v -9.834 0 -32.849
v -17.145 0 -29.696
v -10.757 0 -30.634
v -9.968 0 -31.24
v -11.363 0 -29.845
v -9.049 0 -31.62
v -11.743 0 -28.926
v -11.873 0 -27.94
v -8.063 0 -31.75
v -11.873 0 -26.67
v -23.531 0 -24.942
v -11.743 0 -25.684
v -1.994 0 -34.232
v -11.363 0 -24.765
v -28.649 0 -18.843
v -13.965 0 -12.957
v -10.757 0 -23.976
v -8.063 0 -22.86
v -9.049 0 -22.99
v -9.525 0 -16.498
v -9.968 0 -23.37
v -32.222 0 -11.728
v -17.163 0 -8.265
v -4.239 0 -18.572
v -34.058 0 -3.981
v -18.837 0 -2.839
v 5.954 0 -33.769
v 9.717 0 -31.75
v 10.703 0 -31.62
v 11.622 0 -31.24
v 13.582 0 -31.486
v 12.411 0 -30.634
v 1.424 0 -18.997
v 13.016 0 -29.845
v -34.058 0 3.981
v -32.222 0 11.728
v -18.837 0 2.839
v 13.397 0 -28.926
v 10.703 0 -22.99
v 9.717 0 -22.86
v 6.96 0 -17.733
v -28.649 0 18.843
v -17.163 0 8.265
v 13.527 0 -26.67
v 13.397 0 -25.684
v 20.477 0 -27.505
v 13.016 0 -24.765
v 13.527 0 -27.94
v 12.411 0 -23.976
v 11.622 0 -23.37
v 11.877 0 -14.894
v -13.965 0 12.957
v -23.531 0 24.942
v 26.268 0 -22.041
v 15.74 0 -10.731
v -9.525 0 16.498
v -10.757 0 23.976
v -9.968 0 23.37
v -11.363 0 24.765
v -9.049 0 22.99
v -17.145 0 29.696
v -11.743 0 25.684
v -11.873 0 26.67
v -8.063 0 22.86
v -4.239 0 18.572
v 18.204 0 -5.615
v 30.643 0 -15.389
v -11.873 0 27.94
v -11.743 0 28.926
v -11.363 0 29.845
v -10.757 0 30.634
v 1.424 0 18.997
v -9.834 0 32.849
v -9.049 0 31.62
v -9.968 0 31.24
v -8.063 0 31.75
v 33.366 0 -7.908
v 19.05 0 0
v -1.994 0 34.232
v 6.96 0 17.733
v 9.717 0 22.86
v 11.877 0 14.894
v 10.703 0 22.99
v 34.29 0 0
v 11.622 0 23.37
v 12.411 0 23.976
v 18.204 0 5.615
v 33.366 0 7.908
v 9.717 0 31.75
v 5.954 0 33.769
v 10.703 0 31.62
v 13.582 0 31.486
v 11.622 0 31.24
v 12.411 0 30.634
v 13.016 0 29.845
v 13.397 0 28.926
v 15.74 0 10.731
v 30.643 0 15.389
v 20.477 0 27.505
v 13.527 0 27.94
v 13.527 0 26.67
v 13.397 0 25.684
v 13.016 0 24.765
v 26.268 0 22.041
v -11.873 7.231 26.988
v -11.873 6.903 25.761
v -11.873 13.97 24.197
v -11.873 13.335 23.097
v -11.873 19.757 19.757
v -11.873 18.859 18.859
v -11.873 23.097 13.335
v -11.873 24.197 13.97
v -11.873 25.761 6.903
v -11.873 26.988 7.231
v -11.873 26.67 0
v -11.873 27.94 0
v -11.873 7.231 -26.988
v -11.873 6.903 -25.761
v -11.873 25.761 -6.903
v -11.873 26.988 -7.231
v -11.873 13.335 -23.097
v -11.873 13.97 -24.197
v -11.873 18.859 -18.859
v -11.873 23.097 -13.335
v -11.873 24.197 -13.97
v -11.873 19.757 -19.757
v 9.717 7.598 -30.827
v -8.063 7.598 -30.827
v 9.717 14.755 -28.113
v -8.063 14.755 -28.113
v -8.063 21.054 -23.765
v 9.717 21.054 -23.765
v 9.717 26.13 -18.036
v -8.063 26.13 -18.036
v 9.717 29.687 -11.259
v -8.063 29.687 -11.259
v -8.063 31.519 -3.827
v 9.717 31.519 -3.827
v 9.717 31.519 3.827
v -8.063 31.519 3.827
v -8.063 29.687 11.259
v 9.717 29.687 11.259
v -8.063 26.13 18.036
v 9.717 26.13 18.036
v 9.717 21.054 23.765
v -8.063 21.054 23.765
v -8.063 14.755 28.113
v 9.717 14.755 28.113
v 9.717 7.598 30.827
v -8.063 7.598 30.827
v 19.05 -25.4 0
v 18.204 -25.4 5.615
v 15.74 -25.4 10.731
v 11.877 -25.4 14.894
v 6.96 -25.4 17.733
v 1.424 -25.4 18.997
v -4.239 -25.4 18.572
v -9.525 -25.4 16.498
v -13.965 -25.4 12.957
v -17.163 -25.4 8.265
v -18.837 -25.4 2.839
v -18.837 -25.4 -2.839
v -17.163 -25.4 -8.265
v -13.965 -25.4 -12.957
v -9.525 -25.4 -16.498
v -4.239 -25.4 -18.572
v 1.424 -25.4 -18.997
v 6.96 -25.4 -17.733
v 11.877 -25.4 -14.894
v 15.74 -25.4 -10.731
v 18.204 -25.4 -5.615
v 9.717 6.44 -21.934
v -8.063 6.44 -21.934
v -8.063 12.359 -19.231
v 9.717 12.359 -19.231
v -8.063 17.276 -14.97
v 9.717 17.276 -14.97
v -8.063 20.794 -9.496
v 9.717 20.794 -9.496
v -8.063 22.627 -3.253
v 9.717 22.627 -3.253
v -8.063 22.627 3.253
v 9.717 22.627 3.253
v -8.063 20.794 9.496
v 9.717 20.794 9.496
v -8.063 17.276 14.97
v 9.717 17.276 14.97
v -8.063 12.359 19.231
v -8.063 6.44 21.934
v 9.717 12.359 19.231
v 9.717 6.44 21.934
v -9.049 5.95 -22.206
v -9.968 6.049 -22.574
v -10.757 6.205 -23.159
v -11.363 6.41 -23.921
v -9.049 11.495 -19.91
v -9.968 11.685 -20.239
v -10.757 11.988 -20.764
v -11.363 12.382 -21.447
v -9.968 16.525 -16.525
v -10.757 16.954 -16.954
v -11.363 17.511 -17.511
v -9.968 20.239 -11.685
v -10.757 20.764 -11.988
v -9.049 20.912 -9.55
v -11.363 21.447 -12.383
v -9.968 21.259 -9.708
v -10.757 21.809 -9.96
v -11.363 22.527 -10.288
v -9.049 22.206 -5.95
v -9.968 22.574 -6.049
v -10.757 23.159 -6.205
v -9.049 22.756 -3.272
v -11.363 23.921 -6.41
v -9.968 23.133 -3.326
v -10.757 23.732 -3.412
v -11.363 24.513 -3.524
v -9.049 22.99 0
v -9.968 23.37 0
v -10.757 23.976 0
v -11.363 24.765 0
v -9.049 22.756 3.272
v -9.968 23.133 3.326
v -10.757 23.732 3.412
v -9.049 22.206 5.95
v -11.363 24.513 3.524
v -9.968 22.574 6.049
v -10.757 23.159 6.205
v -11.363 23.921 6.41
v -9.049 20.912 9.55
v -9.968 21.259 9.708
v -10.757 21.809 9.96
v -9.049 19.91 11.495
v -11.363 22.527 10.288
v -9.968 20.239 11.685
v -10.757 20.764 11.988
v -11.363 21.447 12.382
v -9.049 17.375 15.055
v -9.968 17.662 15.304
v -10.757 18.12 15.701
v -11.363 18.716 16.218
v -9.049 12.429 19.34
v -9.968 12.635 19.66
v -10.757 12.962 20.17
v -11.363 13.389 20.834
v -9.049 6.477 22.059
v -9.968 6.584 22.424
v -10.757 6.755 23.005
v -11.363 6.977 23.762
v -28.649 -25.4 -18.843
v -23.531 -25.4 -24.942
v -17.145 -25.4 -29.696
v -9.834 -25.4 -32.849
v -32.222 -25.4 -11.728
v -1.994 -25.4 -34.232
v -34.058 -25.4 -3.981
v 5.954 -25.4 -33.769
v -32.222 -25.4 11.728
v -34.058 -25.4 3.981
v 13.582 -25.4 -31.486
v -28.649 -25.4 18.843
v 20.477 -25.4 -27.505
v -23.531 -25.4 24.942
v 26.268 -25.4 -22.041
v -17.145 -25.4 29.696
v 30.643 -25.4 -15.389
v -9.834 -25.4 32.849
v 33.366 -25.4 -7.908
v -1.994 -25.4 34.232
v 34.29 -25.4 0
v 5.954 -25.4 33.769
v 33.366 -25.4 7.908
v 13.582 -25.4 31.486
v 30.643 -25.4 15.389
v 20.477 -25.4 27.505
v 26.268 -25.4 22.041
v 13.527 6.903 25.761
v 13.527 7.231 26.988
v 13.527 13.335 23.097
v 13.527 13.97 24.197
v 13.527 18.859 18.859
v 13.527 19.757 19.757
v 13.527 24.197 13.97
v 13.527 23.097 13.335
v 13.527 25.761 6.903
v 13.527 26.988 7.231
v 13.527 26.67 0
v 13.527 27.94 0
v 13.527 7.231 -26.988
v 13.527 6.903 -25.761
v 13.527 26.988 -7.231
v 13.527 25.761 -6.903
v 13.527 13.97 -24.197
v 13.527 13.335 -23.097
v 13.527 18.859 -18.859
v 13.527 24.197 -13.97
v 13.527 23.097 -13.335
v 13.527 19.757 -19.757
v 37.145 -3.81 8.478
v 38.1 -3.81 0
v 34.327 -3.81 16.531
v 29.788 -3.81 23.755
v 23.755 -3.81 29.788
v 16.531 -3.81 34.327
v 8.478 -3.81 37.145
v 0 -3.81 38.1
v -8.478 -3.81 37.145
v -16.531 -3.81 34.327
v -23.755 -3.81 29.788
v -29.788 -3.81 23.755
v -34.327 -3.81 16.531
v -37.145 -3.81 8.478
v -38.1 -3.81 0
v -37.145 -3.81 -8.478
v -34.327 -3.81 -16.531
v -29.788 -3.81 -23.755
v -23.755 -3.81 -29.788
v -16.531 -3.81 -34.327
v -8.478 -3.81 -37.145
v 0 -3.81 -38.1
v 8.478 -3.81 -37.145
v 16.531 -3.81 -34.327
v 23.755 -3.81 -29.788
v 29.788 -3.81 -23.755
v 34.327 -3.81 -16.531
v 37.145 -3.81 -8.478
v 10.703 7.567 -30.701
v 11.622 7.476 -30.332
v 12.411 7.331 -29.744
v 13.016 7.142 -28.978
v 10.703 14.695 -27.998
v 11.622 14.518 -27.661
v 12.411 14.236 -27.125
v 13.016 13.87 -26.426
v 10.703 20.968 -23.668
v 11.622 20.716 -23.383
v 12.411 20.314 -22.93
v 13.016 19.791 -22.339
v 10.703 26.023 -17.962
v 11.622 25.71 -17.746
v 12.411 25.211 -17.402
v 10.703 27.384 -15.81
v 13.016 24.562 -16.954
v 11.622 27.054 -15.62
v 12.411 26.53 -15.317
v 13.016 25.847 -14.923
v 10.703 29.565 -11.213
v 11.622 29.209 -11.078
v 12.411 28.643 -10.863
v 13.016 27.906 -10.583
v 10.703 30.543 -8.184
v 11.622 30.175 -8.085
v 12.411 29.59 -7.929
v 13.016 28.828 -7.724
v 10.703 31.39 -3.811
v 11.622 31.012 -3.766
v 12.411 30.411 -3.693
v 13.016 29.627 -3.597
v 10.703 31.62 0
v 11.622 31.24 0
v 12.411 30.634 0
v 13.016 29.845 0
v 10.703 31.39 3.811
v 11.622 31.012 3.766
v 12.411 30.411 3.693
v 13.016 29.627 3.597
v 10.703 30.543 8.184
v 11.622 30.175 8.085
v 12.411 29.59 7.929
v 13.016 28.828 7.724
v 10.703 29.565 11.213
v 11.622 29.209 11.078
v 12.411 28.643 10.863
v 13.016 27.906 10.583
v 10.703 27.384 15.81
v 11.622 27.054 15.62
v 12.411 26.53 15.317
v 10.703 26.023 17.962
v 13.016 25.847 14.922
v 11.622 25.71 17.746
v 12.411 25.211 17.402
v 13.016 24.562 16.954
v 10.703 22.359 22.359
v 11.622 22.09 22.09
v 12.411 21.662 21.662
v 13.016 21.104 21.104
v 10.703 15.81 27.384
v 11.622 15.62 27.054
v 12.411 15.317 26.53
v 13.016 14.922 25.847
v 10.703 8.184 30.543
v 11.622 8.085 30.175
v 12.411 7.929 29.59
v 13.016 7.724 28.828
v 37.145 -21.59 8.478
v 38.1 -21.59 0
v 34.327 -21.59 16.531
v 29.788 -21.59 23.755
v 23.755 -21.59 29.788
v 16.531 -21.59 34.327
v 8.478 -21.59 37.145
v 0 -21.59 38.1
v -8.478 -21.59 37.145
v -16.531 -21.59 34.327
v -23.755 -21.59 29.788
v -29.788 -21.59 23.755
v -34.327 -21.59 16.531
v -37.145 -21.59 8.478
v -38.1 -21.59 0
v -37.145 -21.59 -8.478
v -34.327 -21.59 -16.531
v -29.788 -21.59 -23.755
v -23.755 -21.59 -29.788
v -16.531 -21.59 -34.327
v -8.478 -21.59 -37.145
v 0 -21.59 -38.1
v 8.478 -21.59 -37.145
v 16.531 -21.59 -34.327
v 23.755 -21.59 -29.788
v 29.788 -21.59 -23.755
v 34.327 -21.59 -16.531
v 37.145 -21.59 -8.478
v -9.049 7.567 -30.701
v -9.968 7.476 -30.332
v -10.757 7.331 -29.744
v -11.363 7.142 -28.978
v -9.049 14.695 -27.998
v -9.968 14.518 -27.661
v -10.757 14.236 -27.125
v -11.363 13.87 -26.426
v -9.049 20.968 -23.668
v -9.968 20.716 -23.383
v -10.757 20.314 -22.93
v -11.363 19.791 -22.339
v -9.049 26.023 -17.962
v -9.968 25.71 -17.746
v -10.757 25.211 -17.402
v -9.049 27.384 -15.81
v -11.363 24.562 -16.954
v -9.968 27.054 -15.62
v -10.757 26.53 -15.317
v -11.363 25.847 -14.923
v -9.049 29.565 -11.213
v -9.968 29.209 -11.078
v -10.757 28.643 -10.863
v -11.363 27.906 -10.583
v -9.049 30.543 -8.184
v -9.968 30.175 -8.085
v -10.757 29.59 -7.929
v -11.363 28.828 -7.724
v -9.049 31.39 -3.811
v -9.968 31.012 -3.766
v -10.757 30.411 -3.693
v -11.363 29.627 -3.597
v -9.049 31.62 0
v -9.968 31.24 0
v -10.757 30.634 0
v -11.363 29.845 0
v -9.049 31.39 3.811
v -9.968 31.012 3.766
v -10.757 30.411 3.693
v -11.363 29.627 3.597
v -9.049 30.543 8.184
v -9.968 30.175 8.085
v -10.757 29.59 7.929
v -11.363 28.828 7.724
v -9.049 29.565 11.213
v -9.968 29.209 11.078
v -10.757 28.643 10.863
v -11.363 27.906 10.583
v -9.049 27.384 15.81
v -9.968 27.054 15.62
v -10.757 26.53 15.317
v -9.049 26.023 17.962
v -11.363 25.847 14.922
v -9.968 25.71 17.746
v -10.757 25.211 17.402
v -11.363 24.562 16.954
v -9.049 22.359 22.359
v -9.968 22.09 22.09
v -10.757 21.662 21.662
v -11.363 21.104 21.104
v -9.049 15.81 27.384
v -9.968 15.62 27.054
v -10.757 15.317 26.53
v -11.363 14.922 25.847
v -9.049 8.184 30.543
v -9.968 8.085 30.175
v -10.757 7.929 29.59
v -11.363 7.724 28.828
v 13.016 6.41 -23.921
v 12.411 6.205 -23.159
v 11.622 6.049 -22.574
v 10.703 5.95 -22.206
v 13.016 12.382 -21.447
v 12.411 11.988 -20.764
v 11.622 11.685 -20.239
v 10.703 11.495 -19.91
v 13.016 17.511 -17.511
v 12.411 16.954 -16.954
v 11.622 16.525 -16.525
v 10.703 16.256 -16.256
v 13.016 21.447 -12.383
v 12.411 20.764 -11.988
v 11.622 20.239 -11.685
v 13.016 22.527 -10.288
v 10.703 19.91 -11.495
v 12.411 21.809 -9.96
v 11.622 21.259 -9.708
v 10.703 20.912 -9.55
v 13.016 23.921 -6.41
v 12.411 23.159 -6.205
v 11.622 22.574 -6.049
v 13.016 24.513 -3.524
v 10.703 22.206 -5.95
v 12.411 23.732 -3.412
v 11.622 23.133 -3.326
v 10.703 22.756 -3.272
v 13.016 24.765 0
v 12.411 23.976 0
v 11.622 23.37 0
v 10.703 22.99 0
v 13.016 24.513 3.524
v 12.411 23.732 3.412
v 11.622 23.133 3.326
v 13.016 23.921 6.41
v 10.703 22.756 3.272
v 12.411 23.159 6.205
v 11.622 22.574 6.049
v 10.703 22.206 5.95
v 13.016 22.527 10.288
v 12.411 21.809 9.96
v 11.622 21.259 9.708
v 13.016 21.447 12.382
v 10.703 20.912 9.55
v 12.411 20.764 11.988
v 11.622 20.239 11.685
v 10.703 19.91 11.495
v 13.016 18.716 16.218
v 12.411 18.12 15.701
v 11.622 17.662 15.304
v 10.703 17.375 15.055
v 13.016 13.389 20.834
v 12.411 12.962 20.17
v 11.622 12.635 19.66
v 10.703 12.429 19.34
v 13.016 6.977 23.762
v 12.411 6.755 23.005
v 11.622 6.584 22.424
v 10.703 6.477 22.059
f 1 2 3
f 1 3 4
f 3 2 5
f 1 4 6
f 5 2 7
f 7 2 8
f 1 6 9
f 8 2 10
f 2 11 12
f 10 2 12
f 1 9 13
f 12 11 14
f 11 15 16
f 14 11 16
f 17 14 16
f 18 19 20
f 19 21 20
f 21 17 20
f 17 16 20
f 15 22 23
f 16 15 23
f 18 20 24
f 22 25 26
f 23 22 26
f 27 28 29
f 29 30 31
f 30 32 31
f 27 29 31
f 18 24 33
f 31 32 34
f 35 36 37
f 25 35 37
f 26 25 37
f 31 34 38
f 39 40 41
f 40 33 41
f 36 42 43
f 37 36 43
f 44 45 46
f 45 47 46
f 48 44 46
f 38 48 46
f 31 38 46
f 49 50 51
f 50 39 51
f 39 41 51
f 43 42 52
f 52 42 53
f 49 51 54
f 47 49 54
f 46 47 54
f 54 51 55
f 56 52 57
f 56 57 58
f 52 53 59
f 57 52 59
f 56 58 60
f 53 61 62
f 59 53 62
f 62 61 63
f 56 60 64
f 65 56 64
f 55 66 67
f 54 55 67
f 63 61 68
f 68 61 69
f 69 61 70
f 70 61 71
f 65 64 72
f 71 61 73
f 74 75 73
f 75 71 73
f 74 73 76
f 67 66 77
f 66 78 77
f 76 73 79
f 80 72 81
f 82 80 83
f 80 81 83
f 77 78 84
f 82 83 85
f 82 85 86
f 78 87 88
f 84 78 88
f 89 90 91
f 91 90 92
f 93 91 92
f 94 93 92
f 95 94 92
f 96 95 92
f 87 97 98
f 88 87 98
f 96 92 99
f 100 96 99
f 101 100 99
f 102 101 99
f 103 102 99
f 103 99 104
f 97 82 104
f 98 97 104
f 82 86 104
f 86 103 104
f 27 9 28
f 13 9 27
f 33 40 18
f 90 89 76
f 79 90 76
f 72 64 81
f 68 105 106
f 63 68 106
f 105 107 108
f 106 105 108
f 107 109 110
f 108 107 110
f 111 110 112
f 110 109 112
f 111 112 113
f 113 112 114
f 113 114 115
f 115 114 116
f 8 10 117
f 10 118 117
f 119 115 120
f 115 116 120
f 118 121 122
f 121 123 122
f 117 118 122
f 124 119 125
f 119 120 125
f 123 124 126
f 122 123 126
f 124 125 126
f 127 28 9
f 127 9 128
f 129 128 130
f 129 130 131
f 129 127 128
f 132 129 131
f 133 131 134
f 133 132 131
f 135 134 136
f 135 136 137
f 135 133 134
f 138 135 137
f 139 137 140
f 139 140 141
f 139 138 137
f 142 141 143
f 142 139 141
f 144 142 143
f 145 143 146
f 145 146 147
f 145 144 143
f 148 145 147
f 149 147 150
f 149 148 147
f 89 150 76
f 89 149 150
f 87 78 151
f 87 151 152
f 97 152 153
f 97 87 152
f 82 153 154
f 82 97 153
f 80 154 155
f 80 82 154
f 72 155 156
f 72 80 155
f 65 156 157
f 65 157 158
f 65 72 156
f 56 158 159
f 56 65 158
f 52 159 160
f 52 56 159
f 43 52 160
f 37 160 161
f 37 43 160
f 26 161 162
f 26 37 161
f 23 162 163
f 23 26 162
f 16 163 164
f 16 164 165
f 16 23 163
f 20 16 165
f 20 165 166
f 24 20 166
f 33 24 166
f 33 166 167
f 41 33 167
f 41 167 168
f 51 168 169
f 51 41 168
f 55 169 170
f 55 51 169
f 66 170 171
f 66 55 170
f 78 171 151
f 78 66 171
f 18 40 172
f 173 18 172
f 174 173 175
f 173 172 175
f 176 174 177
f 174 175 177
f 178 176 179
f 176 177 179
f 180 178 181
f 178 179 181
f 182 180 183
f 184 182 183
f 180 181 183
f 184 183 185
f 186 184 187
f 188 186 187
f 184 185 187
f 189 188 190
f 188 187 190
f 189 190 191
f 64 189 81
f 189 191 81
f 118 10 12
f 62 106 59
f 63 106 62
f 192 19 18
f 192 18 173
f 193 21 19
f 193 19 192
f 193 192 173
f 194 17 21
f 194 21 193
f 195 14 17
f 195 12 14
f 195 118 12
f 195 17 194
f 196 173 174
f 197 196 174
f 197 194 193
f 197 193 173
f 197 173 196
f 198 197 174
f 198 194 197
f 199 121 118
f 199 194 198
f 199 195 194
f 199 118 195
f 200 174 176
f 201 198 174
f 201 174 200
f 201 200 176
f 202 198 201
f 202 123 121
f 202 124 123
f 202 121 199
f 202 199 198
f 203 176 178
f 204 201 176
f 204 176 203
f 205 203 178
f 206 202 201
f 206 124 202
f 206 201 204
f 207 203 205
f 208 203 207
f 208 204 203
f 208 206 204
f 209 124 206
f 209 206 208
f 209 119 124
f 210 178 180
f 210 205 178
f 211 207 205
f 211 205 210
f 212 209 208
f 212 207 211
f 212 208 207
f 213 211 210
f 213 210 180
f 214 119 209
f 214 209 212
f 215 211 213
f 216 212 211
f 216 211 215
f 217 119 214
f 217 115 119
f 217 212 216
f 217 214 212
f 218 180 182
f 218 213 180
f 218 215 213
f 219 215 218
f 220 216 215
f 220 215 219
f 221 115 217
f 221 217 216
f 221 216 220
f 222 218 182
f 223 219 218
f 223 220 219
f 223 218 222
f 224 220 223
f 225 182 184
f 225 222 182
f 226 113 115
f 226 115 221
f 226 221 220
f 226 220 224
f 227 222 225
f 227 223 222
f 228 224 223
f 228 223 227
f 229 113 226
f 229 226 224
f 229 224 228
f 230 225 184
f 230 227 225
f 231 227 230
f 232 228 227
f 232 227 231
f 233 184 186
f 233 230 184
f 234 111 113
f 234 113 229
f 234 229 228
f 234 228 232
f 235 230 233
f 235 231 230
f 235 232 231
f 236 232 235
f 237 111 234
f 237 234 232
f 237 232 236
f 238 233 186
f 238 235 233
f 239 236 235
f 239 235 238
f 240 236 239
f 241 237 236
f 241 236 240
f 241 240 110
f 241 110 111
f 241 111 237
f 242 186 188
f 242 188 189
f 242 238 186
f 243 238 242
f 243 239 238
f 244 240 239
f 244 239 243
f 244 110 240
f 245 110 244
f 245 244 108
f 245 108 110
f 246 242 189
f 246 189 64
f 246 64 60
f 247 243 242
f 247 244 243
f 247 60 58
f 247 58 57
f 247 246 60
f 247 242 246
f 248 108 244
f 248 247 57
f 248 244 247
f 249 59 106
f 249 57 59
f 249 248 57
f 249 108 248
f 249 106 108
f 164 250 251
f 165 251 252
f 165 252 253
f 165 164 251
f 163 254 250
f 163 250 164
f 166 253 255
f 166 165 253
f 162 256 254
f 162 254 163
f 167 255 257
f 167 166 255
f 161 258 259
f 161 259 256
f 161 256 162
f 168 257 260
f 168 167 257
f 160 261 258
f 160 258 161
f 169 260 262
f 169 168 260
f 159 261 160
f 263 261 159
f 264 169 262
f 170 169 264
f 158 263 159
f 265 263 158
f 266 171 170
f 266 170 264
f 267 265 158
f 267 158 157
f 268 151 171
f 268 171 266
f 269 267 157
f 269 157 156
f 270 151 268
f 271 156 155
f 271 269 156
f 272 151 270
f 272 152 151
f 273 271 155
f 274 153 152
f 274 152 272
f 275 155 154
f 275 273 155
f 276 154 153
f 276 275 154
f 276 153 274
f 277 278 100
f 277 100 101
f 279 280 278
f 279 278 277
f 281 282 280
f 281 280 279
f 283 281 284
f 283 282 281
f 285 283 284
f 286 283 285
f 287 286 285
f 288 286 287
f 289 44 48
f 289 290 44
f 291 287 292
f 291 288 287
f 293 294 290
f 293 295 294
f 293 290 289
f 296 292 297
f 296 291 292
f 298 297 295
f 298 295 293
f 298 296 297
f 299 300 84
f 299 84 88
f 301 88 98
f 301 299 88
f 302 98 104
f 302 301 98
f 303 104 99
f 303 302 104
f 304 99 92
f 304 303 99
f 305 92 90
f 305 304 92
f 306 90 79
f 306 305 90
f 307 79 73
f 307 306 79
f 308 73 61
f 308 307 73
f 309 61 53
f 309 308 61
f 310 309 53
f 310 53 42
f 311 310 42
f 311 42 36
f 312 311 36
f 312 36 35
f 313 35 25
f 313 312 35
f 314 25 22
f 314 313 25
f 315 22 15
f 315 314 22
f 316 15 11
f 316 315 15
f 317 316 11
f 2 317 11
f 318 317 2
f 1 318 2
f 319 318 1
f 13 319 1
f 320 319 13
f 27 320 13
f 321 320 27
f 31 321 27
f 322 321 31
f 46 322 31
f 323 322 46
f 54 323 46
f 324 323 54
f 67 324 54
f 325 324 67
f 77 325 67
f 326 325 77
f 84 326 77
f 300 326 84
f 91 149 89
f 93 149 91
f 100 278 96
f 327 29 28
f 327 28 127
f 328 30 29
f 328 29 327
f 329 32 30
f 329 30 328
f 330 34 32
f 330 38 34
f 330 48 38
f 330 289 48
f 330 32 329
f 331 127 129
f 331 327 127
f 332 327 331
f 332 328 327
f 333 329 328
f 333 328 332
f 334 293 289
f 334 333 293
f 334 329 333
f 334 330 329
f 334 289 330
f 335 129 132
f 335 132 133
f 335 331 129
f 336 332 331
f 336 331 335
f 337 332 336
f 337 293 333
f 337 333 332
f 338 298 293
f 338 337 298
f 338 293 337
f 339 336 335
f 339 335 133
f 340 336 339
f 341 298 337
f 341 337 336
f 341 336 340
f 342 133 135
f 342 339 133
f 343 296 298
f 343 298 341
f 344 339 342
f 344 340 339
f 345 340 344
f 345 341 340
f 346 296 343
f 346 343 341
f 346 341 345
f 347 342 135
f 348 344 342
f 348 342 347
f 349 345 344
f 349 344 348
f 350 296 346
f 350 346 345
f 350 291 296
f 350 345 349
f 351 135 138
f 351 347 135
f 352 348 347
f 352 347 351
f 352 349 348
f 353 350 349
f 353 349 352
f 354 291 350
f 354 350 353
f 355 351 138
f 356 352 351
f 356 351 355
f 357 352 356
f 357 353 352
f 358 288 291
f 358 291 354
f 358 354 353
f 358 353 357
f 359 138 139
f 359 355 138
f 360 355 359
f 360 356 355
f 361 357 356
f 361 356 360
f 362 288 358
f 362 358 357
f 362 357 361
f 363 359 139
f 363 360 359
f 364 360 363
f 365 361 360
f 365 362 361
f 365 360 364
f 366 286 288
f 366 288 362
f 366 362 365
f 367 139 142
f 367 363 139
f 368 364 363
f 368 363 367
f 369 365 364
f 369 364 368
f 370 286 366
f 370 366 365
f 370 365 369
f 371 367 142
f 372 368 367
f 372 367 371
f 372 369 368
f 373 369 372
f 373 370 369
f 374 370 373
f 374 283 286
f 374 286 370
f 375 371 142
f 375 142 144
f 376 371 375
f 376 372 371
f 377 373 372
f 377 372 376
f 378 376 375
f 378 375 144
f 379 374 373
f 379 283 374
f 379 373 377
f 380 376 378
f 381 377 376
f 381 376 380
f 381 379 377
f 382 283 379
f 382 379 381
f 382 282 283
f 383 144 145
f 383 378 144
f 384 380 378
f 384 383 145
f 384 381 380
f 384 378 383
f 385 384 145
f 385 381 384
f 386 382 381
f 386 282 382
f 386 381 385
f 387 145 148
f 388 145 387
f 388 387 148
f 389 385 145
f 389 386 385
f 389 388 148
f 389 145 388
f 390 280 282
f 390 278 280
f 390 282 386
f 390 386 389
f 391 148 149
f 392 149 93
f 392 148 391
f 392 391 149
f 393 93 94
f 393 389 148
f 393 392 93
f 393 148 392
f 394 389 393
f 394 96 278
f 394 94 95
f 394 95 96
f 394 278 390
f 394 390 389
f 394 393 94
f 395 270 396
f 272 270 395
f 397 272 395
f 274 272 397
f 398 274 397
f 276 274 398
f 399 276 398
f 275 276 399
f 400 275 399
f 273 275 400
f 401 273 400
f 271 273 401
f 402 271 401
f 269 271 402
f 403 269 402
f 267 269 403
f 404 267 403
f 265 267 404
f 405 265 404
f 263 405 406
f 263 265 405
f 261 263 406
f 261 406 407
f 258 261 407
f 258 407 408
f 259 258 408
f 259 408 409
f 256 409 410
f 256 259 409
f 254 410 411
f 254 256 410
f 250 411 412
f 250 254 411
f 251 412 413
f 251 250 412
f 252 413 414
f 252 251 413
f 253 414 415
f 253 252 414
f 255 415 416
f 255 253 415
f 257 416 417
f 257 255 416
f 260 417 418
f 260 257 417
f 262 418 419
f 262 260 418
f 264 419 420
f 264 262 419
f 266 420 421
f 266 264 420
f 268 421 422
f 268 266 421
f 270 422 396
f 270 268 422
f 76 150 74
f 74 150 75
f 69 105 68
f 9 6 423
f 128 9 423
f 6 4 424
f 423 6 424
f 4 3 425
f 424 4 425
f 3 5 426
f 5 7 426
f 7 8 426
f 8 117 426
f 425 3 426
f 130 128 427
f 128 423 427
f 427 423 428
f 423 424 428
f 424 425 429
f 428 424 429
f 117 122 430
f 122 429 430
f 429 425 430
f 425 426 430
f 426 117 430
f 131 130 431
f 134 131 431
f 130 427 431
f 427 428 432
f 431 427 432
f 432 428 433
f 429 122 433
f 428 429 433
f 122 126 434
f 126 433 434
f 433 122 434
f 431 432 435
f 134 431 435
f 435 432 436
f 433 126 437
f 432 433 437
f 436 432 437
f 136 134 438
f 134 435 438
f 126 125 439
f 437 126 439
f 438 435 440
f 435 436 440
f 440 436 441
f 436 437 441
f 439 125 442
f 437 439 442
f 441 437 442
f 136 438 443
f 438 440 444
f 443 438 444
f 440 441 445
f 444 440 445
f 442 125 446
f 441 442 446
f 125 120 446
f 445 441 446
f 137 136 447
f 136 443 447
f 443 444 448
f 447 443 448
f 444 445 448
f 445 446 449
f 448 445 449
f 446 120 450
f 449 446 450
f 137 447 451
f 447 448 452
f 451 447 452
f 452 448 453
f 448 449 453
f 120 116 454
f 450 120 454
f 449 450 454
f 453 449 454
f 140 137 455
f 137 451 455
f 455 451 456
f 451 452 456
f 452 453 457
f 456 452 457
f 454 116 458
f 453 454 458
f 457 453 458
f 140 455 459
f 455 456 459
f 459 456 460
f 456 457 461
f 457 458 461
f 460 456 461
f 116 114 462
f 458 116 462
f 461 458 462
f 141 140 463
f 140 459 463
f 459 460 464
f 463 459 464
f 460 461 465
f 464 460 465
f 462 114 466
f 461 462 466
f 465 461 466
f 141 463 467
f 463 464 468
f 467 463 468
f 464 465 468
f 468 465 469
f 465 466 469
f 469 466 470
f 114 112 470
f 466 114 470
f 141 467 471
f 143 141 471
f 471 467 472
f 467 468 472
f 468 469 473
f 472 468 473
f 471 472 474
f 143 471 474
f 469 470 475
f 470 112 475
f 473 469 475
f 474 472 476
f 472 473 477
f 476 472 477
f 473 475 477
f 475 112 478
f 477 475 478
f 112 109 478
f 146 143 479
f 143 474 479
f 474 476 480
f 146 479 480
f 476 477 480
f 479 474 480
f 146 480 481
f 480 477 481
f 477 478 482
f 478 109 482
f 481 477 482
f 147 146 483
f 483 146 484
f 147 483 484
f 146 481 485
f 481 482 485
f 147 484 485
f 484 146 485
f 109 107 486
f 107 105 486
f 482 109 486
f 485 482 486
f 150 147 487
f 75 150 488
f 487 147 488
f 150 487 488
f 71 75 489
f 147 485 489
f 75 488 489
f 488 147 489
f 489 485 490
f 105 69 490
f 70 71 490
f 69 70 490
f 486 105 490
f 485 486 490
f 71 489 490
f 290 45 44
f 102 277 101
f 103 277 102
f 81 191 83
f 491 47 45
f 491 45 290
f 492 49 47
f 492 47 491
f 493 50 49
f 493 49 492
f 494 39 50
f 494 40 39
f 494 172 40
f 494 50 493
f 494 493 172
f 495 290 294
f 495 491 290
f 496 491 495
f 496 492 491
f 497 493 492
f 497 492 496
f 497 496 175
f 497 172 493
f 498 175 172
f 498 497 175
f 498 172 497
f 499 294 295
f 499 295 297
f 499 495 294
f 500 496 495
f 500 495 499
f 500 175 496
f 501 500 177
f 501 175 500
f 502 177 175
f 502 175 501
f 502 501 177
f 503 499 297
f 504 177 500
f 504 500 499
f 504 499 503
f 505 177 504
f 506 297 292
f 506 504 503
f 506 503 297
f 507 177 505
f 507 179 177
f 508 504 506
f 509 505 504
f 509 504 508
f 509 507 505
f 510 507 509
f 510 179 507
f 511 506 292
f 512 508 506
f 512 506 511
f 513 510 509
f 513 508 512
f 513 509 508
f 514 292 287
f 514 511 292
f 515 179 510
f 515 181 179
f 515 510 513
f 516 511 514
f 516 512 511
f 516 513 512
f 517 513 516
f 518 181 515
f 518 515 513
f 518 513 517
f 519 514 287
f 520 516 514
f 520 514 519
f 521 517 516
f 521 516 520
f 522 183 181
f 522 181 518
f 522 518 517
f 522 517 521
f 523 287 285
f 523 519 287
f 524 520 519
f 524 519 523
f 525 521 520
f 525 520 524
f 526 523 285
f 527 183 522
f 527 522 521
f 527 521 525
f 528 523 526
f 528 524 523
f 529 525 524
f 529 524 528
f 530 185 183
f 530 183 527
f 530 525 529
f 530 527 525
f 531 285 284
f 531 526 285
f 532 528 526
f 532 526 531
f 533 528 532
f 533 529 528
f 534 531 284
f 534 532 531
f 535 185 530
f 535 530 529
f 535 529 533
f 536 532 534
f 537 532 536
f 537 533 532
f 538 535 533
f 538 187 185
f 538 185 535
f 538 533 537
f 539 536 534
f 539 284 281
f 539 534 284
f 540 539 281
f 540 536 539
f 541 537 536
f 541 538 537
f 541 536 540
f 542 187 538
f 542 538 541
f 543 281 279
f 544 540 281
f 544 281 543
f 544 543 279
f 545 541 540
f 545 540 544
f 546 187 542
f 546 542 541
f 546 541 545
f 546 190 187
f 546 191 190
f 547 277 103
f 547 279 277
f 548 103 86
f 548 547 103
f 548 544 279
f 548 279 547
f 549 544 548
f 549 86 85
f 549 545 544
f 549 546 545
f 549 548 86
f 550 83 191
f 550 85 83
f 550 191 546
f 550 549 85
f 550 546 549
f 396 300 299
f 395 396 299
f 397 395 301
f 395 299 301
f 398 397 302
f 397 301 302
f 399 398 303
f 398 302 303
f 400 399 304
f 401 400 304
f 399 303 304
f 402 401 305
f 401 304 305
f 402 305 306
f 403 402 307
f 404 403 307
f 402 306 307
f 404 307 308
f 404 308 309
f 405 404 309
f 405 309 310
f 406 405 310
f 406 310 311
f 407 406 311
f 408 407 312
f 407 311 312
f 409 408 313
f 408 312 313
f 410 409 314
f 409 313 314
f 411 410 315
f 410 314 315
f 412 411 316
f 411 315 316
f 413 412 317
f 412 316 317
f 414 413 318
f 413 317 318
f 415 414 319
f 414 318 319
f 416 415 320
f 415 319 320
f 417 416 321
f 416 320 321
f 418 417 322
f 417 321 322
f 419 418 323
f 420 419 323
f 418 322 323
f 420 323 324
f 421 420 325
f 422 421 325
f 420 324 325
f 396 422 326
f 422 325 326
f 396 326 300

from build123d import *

# Parameters (mm, degrees)
F0_R     = 38.1
F0_R_2   = 19.05
F1_DEPTH = 25.4
F2_W     = 25.4
F2_H     = 8.89
F3_ANGLE = 180
F4_R     = 3.81
F5_SIZE  = 3.81


with BuildPart() as f1:
    # F0 (on Front) → F1 (new body)
    with BuildSketch(Plane.XZ):
        Circle(F0_R)
        Circle(F0_R_2, mode=Mode.SUBTRACT)
    extrude(amount=F1_DEPTH)

    # F2 (on Front) → F3 (revolve)
    with BuildSketch(Plane.XZ):
        with Locations((0.826871, -27.305)):
            Rectangle(F2_W, F2_H)
    revolve(axis=Axis((0.153273, 0, 0), (1, 0, 0)), revolution_arc=F3_ANGLE)

    # F4
    f4_edges = [f1.edges().sort_by_distance(p)[0] for p in [
        (13.526871, 31.75, 0),
        (-11.873129, 31.75, 0),
        (-11.873129, 22.86, 0),
        (13.526871, 22.86, 0),
    ]]
    fillet(f4_edges, radius=F4_R)

    # F5
    f5_edges = [f1.edges().sort_by_distance(p)[0] for p in [
        (-38.1, 0, 0),
        (-38.1, -25.4, 0),
    ]]
    chamfer(f5_edges, length=F5_SIZE)


solid = f1.part
